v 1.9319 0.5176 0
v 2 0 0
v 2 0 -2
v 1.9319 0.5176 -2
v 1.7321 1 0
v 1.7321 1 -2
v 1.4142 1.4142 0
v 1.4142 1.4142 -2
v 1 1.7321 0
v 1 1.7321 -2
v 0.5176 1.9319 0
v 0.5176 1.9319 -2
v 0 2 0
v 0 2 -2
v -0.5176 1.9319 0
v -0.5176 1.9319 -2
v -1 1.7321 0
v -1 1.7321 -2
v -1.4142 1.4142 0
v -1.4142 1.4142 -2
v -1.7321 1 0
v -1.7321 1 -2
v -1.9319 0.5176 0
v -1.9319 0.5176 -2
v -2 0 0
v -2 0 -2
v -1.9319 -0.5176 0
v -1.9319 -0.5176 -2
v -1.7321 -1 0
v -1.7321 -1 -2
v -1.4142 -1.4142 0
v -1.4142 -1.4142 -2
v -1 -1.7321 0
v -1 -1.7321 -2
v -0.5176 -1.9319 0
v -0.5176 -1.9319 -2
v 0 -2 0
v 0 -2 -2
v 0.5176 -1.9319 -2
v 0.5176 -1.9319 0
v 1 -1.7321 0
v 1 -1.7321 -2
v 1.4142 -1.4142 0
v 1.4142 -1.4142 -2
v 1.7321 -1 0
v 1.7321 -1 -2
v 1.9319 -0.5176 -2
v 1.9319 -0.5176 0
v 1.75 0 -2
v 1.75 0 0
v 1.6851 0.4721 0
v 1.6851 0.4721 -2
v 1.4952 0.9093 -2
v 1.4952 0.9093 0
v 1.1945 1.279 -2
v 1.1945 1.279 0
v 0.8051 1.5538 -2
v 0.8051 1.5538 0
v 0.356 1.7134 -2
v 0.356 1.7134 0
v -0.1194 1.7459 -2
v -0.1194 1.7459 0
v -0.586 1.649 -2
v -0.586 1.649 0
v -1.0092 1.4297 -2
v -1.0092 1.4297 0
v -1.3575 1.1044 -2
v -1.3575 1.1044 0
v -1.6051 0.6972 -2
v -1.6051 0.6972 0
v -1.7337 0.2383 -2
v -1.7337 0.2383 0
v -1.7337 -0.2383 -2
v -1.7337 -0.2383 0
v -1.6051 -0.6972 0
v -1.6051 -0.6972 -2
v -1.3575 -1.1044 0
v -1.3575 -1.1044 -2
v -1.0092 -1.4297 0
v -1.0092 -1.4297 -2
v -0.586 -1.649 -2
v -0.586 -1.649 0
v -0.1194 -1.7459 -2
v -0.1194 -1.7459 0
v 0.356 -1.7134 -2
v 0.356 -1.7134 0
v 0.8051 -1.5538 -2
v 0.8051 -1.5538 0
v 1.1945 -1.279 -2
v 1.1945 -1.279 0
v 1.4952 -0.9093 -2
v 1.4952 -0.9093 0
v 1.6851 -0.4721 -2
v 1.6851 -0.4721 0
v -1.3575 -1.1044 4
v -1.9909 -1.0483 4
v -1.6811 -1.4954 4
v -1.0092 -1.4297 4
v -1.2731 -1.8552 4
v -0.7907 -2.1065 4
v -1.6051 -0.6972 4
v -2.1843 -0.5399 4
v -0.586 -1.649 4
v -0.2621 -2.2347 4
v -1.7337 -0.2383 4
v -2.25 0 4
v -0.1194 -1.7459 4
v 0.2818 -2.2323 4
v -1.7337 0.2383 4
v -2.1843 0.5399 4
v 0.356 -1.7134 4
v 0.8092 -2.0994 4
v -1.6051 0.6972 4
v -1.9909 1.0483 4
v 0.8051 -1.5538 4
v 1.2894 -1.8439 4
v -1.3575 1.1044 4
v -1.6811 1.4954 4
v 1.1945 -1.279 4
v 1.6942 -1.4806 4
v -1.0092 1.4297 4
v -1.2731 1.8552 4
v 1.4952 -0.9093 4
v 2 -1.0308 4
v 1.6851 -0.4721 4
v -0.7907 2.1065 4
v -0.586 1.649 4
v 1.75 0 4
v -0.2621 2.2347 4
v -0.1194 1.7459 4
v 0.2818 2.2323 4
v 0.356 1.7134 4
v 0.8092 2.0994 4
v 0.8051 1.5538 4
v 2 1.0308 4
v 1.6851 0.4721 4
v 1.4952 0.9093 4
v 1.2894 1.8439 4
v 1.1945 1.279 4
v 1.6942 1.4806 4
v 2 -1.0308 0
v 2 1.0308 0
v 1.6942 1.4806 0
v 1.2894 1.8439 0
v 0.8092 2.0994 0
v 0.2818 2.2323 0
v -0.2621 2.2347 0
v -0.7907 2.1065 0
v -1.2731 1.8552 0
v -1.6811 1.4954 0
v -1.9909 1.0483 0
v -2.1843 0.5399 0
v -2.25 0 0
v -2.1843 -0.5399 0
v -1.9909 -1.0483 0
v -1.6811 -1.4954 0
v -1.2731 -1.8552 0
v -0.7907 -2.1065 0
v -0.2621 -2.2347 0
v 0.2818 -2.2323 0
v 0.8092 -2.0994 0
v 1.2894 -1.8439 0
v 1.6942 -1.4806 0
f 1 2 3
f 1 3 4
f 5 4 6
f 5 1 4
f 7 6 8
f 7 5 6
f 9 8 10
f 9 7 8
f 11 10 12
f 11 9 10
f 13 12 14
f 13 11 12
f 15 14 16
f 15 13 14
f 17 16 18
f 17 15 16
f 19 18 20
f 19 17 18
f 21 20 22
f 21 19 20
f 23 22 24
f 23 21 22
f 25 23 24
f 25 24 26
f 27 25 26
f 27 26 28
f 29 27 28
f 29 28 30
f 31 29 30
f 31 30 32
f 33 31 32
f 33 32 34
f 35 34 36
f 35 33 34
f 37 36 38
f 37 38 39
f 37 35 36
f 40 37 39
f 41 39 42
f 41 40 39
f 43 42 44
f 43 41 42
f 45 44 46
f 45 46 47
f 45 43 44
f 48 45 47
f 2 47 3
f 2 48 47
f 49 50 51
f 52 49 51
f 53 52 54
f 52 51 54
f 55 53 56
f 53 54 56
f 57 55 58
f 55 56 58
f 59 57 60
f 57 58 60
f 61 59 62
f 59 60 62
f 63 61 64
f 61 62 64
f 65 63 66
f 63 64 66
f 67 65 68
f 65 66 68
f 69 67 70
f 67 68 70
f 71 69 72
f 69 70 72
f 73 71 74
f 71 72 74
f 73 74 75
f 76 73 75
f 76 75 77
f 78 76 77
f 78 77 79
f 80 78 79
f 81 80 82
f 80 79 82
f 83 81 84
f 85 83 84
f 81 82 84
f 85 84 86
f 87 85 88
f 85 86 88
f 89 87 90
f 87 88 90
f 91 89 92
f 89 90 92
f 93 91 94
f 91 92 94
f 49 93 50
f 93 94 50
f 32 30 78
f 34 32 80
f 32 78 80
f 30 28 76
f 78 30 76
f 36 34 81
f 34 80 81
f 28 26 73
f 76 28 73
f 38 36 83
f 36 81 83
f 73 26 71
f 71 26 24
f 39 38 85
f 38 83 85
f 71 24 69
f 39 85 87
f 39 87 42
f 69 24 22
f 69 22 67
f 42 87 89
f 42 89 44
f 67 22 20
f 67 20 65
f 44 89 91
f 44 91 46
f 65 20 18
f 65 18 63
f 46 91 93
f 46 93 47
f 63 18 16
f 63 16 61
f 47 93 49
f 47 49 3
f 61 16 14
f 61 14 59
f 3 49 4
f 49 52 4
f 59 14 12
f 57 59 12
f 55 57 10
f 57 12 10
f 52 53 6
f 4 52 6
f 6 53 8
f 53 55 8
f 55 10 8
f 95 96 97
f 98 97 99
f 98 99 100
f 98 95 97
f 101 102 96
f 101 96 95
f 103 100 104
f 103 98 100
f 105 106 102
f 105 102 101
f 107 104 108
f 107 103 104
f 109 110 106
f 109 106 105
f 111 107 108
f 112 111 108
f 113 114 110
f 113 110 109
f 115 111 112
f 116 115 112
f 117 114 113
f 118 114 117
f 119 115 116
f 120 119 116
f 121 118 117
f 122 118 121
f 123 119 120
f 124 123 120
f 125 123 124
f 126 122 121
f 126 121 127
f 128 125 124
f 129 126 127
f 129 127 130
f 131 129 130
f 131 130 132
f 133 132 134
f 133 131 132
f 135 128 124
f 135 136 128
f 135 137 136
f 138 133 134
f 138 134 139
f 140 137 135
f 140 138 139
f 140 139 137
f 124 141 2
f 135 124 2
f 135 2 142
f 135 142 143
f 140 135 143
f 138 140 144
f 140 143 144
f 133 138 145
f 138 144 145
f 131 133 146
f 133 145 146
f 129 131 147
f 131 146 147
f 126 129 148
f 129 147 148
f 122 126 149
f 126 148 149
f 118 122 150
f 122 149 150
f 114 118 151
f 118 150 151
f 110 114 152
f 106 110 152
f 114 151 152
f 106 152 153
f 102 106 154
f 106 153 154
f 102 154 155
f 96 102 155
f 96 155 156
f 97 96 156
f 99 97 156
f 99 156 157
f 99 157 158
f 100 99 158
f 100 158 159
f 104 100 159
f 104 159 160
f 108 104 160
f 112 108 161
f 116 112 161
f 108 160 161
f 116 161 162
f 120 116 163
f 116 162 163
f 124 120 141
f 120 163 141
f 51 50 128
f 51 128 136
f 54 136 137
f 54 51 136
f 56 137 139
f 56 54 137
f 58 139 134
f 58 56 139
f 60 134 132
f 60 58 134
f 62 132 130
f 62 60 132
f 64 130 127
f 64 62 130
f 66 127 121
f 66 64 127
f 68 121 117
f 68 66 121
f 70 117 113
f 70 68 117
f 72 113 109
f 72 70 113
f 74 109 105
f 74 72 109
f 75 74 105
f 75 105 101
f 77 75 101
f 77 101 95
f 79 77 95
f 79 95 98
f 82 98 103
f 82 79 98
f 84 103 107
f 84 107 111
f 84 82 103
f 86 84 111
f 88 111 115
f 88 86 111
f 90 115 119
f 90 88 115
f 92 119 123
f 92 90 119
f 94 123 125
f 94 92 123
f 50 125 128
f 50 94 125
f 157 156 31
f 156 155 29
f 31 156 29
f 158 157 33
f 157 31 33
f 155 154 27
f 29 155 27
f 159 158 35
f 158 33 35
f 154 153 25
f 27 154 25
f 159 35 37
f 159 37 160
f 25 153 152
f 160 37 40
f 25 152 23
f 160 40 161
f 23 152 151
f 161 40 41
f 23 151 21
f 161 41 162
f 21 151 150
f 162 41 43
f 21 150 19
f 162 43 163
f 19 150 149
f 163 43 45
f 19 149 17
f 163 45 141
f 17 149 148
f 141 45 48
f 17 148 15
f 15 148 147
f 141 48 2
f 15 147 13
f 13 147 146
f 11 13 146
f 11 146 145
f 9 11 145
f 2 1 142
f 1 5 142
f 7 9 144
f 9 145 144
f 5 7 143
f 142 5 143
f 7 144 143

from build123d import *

# Parameters (mm, degrees)
F0_R     = 2
F0_R_2   = 1.75
F1_DEPTH = 4
F2_DEPTH = 2


with BuildPart() as f1:
    # F0 (on Top) → F1 (new body)
    with BuildSketch(Plane.XY):
        with BuildLine():
            Line((2, 0), (2, 1.0307764064))
            ThreePointArc((2, 1.0307764064), (-2.25, 0), (2, -1.0307764064))
            Line((2, -1.0307764064), (2, 0))
        make_face()
        Circle(F0_R, mode=Mode.SUBTRACT)
        Circle(F0_R)
        Circle(F0_R_2, mode=Mode.SUBTRACT)
    extrude(amount=F1_DEPTH)

    # F0 (on Top) → F2 (join)
    with BuildSketch(Plane.XY):
        Circle(F0_R)
        Circle(F0_R_2, mode=Mode.SUBTRACT)
    extrude(amount=-F2_DEPTH)


solid = f1.part
